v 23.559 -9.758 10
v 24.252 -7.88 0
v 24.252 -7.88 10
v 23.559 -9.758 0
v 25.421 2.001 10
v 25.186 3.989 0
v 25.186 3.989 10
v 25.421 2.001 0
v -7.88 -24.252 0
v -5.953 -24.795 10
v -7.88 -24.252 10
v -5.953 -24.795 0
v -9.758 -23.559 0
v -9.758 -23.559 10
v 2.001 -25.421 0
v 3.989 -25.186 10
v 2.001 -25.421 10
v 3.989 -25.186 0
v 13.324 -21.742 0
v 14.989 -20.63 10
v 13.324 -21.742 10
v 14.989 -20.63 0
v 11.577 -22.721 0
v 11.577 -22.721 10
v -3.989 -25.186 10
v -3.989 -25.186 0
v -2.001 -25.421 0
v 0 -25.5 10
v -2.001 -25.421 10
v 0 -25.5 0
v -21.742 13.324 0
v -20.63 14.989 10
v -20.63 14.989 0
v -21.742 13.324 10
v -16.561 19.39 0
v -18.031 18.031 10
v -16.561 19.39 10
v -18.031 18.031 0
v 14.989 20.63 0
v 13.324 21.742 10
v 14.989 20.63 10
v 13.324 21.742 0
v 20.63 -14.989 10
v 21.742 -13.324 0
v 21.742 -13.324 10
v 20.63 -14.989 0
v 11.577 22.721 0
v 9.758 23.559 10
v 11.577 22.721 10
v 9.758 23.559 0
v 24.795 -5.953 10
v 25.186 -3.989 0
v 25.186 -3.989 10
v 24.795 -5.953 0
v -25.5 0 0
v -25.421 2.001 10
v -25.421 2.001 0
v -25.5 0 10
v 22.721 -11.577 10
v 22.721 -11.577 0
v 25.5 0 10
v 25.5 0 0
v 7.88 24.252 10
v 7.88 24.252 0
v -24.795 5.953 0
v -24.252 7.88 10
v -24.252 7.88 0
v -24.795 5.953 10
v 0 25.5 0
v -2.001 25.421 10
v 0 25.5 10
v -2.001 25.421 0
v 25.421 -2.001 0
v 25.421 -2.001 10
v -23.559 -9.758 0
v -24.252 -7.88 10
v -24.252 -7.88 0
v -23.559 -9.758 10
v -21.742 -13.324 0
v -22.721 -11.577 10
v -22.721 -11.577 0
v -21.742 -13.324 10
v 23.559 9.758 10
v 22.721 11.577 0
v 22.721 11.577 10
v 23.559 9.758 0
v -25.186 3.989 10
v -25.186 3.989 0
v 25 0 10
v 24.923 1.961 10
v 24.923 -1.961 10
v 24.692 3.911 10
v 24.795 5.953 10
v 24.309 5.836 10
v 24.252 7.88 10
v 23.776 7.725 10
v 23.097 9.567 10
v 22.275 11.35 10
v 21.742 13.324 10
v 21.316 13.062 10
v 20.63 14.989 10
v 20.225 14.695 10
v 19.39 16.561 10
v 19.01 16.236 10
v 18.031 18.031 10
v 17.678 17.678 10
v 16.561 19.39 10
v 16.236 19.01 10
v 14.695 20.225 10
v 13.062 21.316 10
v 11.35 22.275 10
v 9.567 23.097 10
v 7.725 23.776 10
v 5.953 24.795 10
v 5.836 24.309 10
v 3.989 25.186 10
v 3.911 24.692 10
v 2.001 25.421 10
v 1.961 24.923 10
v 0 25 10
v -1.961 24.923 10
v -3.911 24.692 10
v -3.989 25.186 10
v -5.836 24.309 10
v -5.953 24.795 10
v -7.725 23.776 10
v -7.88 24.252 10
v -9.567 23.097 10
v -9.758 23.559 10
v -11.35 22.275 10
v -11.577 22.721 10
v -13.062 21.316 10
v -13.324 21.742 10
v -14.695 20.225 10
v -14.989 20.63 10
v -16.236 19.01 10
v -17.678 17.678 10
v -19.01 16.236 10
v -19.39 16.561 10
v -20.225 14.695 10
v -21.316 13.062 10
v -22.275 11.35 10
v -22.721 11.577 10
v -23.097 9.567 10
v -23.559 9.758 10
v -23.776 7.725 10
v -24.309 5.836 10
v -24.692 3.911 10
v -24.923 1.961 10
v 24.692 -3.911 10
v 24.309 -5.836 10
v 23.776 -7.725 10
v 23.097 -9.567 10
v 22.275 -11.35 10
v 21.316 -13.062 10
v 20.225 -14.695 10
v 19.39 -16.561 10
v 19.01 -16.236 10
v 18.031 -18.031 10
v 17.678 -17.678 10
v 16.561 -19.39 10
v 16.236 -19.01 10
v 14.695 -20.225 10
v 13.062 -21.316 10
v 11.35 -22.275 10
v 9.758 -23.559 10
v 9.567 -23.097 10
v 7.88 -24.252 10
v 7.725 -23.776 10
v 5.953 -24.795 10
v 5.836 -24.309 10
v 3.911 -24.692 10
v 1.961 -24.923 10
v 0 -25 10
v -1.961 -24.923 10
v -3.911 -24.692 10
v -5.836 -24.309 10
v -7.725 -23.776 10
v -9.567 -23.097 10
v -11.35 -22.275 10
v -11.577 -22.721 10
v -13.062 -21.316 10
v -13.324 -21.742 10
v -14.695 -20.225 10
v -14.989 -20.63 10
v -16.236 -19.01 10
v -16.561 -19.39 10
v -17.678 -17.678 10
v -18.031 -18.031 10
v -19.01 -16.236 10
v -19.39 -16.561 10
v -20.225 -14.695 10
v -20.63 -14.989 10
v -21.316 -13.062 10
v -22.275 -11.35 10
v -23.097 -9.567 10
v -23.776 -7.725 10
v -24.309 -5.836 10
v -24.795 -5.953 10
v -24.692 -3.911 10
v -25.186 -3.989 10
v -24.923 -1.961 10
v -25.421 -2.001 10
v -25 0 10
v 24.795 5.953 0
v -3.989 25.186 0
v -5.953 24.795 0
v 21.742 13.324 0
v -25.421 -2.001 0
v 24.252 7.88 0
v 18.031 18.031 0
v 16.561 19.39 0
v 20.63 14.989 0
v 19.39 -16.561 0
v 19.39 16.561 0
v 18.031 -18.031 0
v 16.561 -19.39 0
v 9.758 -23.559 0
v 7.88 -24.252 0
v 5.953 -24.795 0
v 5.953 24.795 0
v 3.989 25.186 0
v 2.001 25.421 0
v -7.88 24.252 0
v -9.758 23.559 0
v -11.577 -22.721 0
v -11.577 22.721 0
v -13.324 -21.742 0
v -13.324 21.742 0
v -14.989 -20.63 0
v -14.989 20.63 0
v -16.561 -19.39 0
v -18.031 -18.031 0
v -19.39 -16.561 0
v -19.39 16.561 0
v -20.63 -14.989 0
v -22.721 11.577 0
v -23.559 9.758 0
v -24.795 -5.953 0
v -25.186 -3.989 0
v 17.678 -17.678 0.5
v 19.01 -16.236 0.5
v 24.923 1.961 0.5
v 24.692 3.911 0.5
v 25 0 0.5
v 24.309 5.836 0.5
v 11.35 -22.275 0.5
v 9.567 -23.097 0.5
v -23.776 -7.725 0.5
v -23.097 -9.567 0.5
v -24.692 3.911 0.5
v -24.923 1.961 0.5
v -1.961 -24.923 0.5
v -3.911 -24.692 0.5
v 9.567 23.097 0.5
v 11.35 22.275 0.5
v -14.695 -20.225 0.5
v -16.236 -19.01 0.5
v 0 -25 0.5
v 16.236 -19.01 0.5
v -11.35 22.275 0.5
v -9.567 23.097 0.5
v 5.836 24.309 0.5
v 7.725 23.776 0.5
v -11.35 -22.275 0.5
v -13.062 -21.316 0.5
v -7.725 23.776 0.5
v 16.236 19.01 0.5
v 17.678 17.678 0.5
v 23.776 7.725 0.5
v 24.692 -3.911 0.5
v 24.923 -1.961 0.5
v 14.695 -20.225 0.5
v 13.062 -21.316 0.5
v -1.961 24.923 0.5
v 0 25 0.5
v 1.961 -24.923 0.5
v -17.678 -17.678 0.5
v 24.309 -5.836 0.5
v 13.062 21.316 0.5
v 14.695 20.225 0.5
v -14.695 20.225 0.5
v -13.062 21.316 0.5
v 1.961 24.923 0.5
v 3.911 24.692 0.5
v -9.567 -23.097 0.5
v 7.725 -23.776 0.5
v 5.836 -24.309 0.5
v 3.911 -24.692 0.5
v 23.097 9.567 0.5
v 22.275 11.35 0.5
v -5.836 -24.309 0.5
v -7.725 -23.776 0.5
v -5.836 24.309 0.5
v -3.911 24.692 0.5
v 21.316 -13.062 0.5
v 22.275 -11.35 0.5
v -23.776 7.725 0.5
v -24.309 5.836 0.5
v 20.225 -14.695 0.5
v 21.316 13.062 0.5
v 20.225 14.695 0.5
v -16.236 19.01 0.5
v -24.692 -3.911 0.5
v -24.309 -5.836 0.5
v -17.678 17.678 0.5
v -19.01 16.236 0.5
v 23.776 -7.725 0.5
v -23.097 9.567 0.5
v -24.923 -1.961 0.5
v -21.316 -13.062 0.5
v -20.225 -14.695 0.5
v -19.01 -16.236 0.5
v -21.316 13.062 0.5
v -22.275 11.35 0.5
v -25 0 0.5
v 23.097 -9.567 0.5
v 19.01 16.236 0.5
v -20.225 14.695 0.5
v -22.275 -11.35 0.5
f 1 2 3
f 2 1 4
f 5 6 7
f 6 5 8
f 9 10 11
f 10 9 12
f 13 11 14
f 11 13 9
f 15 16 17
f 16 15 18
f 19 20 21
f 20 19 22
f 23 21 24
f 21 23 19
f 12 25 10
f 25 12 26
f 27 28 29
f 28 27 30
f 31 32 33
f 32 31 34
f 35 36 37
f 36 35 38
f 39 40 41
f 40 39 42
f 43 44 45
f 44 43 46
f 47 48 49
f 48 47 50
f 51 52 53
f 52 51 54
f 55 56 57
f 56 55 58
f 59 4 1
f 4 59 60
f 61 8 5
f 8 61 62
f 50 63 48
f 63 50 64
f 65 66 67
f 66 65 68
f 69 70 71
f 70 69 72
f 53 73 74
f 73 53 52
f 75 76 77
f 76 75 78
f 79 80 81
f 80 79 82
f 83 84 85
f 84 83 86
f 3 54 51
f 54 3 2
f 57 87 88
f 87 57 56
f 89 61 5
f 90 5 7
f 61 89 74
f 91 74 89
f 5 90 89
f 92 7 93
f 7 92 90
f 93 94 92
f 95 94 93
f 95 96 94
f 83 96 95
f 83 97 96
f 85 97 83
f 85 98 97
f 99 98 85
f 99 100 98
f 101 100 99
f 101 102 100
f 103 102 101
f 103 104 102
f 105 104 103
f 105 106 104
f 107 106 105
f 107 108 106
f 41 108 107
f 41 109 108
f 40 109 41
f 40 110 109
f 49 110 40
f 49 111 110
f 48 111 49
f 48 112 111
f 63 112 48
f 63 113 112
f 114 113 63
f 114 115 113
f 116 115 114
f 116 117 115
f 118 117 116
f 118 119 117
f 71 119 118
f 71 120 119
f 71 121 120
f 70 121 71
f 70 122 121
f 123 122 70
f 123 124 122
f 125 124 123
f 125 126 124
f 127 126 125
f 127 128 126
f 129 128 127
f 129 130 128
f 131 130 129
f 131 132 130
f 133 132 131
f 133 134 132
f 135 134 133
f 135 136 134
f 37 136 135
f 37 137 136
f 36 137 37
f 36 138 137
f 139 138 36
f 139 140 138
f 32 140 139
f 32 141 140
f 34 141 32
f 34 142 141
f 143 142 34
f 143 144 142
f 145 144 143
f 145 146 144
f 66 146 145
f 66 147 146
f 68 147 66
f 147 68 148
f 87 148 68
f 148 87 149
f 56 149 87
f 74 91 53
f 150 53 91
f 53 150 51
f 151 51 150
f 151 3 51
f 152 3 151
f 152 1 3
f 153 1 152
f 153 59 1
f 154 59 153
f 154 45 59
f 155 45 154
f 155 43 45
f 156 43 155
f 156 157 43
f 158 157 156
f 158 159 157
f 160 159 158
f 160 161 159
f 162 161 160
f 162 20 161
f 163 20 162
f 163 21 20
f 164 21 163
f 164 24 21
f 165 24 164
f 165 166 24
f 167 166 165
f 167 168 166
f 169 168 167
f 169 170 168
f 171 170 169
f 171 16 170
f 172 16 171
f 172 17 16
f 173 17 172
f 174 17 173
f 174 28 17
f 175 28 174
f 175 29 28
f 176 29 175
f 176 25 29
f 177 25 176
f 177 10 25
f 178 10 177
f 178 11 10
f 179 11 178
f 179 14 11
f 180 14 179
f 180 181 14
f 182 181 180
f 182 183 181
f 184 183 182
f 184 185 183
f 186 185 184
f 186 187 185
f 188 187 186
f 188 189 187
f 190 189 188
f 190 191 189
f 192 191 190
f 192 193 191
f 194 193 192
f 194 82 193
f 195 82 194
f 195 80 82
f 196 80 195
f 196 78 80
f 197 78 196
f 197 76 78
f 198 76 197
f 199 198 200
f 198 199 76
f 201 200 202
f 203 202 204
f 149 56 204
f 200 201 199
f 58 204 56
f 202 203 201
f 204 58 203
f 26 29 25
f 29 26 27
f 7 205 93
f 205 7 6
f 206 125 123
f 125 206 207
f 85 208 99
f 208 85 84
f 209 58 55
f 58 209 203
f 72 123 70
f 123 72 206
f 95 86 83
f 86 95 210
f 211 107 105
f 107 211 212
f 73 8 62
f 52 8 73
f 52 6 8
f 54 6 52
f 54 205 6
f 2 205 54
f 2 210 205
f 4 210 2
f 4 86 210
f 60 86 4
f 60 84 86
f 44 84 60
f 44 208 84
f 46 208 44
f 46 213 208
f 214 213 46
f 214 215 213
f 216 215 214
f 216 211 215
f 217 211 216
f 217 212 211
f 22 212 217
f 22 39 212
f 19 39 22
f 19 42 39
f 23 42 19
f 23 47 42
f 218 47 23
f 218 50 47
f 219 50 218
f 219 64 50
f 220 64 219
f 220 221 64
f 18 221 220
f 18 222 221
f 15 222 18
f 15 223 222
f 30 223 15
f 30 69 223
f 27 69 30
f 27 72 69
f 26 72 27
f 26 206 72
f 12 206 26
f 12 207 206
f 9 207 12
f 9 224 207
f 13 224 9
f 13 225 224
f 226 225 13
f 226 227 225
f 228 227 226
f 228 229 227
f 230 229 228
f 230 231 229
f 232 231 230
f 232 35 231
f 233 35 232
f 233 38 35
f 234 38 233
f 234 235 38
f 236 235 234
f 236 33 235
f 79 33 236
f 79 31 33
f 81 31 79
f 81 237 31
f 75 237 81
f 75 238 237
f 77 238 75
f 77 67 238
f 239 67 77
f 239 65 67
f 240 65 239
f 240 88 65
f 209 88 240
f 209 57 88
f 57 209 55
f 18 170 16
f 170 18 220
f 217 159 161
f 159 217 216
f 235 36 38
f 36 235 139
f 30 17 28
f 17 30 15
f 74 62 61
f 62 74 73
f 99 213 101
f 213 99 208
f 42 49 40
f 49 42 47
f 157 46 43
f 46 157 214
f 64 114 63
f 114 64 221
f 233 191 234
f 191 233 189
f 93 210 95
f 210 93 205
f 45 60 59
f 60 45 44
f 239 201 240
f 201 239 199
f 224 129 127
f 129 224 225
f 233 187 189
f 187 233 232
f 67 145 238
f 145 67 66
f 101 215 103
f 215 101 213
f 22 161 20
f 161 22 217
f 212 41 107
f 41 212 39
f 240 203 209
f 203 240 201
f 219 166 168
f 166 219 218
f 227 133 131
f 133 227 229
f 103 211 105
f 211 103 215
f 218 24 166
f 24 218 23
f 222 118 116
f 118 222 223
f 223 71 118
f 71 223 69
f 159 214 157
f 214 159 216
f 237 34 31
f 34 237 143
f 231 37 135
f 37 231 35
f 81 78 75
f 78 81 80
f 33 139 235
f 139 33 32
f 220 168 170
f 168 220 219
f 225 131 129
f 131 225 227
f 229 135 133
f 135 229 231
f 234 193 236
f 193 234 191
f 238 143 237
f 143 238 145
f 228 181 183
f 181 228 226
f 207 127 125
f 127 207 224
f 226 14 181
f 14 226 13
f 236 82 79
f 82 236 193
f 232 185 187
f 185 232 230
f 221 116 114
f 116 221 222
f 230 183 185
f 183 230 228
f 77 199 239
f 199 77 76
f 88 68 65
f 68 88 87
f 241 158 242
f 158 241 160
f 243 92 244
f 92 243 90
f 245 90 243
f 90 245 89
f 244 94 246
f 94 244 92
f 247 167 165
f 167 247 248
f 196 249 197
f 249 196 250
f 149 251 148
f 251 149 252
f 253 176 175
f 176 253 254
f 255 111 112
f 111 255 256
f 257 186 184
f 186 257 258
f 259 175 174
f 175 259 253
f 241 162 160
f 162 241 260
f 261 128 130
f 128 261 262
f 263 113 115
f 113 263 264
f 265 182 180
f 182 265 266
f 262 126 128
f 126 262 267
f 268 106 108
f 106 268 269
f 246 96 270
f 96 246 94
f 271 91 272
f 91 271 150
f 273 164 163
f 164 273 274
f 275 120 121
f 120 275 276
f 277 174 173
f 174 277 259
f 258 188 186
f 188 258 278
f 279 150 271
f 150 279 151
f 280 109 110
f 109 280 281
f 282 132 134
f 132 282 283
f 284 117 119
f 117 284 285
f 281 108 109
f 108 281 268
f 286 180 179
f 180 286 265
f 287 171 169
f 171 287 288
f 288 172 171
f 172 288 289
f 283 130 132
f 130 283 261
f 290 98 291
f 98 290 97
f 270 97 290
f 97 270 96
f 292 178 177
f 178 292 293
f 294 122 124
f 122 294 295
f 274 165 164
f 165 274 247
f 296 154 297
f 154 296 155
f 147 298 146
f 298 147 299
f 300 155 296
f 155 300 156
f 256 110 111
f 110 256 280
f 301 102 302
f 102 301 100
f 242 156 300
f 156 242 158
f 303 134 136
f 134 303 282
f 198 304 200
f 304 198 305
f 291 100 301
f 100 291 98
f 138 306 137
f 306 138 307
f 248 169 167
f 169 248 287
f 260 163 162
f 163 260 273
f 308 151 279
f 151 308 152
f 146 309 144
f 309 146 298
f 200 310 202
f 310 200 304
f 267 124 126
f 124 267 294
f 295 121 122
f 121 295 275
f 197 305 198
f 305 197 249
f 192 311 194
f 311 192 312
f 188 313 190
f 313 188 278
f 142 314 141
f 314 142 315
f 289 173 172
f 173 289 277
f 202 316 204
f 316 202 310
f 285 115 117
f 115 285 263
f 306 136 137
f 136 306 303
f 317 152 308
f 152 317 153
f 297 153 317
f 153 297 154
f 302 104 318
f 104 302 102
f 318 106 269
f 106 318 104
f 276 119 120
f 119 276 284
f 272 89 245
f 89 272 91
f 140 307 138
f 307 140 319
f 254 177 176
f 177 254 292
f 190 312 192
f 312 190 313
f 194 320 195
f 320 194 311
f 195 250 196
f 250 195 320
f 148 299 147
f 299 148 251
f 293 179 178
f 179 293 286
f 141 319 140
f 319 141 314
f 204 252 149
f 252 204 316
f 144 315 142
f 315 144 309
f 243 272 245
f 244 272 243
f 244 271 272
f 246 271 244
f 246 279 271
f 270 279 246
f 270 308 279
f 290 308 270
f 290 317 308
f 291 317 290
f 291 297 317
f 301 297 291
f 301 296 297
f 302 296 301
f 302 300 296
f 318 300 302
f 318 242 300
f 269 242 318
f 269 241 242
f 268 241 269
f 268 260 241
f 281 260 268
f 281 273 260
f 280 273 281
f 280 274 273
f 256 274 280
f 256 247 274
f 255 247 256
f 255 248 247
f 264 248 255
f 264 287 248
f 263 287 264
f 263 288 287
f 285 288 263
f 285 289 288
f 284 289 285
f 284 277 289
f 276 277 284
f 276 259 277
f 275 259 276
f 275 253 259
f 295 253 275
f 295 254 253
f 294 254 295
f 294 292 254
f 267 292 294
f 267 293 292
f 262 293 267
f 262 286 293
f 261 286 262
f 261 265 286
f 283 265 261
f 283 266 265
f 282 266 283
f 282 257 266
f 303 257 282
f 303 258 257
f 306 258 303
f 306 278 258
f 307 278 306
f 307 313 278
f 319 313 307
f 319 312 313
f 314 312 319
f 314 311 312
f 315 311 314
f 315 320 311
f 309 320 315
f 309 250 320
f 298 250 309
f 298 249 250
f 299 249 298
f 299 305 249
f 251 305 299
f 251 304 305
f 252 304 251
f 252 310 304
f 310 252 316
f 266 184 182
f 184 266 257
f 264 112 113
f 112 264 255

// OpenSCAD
//!OpenSCAD
// Customizable tube cap

// Resolution
$fn = 80;
cap_inside_diameter = 50;
wall_thickness = 0.5;
floor_thickness = 0.5;
cap_height = 10;

difference() {
    cylinder(r = cap_inside_diameter  / 2 + wall_thickness, h = cap_height);
    translate([0, 0, floor_thickness])
        cylinder(r = cap_inside_diameter / 2, h = cap_height);
}
